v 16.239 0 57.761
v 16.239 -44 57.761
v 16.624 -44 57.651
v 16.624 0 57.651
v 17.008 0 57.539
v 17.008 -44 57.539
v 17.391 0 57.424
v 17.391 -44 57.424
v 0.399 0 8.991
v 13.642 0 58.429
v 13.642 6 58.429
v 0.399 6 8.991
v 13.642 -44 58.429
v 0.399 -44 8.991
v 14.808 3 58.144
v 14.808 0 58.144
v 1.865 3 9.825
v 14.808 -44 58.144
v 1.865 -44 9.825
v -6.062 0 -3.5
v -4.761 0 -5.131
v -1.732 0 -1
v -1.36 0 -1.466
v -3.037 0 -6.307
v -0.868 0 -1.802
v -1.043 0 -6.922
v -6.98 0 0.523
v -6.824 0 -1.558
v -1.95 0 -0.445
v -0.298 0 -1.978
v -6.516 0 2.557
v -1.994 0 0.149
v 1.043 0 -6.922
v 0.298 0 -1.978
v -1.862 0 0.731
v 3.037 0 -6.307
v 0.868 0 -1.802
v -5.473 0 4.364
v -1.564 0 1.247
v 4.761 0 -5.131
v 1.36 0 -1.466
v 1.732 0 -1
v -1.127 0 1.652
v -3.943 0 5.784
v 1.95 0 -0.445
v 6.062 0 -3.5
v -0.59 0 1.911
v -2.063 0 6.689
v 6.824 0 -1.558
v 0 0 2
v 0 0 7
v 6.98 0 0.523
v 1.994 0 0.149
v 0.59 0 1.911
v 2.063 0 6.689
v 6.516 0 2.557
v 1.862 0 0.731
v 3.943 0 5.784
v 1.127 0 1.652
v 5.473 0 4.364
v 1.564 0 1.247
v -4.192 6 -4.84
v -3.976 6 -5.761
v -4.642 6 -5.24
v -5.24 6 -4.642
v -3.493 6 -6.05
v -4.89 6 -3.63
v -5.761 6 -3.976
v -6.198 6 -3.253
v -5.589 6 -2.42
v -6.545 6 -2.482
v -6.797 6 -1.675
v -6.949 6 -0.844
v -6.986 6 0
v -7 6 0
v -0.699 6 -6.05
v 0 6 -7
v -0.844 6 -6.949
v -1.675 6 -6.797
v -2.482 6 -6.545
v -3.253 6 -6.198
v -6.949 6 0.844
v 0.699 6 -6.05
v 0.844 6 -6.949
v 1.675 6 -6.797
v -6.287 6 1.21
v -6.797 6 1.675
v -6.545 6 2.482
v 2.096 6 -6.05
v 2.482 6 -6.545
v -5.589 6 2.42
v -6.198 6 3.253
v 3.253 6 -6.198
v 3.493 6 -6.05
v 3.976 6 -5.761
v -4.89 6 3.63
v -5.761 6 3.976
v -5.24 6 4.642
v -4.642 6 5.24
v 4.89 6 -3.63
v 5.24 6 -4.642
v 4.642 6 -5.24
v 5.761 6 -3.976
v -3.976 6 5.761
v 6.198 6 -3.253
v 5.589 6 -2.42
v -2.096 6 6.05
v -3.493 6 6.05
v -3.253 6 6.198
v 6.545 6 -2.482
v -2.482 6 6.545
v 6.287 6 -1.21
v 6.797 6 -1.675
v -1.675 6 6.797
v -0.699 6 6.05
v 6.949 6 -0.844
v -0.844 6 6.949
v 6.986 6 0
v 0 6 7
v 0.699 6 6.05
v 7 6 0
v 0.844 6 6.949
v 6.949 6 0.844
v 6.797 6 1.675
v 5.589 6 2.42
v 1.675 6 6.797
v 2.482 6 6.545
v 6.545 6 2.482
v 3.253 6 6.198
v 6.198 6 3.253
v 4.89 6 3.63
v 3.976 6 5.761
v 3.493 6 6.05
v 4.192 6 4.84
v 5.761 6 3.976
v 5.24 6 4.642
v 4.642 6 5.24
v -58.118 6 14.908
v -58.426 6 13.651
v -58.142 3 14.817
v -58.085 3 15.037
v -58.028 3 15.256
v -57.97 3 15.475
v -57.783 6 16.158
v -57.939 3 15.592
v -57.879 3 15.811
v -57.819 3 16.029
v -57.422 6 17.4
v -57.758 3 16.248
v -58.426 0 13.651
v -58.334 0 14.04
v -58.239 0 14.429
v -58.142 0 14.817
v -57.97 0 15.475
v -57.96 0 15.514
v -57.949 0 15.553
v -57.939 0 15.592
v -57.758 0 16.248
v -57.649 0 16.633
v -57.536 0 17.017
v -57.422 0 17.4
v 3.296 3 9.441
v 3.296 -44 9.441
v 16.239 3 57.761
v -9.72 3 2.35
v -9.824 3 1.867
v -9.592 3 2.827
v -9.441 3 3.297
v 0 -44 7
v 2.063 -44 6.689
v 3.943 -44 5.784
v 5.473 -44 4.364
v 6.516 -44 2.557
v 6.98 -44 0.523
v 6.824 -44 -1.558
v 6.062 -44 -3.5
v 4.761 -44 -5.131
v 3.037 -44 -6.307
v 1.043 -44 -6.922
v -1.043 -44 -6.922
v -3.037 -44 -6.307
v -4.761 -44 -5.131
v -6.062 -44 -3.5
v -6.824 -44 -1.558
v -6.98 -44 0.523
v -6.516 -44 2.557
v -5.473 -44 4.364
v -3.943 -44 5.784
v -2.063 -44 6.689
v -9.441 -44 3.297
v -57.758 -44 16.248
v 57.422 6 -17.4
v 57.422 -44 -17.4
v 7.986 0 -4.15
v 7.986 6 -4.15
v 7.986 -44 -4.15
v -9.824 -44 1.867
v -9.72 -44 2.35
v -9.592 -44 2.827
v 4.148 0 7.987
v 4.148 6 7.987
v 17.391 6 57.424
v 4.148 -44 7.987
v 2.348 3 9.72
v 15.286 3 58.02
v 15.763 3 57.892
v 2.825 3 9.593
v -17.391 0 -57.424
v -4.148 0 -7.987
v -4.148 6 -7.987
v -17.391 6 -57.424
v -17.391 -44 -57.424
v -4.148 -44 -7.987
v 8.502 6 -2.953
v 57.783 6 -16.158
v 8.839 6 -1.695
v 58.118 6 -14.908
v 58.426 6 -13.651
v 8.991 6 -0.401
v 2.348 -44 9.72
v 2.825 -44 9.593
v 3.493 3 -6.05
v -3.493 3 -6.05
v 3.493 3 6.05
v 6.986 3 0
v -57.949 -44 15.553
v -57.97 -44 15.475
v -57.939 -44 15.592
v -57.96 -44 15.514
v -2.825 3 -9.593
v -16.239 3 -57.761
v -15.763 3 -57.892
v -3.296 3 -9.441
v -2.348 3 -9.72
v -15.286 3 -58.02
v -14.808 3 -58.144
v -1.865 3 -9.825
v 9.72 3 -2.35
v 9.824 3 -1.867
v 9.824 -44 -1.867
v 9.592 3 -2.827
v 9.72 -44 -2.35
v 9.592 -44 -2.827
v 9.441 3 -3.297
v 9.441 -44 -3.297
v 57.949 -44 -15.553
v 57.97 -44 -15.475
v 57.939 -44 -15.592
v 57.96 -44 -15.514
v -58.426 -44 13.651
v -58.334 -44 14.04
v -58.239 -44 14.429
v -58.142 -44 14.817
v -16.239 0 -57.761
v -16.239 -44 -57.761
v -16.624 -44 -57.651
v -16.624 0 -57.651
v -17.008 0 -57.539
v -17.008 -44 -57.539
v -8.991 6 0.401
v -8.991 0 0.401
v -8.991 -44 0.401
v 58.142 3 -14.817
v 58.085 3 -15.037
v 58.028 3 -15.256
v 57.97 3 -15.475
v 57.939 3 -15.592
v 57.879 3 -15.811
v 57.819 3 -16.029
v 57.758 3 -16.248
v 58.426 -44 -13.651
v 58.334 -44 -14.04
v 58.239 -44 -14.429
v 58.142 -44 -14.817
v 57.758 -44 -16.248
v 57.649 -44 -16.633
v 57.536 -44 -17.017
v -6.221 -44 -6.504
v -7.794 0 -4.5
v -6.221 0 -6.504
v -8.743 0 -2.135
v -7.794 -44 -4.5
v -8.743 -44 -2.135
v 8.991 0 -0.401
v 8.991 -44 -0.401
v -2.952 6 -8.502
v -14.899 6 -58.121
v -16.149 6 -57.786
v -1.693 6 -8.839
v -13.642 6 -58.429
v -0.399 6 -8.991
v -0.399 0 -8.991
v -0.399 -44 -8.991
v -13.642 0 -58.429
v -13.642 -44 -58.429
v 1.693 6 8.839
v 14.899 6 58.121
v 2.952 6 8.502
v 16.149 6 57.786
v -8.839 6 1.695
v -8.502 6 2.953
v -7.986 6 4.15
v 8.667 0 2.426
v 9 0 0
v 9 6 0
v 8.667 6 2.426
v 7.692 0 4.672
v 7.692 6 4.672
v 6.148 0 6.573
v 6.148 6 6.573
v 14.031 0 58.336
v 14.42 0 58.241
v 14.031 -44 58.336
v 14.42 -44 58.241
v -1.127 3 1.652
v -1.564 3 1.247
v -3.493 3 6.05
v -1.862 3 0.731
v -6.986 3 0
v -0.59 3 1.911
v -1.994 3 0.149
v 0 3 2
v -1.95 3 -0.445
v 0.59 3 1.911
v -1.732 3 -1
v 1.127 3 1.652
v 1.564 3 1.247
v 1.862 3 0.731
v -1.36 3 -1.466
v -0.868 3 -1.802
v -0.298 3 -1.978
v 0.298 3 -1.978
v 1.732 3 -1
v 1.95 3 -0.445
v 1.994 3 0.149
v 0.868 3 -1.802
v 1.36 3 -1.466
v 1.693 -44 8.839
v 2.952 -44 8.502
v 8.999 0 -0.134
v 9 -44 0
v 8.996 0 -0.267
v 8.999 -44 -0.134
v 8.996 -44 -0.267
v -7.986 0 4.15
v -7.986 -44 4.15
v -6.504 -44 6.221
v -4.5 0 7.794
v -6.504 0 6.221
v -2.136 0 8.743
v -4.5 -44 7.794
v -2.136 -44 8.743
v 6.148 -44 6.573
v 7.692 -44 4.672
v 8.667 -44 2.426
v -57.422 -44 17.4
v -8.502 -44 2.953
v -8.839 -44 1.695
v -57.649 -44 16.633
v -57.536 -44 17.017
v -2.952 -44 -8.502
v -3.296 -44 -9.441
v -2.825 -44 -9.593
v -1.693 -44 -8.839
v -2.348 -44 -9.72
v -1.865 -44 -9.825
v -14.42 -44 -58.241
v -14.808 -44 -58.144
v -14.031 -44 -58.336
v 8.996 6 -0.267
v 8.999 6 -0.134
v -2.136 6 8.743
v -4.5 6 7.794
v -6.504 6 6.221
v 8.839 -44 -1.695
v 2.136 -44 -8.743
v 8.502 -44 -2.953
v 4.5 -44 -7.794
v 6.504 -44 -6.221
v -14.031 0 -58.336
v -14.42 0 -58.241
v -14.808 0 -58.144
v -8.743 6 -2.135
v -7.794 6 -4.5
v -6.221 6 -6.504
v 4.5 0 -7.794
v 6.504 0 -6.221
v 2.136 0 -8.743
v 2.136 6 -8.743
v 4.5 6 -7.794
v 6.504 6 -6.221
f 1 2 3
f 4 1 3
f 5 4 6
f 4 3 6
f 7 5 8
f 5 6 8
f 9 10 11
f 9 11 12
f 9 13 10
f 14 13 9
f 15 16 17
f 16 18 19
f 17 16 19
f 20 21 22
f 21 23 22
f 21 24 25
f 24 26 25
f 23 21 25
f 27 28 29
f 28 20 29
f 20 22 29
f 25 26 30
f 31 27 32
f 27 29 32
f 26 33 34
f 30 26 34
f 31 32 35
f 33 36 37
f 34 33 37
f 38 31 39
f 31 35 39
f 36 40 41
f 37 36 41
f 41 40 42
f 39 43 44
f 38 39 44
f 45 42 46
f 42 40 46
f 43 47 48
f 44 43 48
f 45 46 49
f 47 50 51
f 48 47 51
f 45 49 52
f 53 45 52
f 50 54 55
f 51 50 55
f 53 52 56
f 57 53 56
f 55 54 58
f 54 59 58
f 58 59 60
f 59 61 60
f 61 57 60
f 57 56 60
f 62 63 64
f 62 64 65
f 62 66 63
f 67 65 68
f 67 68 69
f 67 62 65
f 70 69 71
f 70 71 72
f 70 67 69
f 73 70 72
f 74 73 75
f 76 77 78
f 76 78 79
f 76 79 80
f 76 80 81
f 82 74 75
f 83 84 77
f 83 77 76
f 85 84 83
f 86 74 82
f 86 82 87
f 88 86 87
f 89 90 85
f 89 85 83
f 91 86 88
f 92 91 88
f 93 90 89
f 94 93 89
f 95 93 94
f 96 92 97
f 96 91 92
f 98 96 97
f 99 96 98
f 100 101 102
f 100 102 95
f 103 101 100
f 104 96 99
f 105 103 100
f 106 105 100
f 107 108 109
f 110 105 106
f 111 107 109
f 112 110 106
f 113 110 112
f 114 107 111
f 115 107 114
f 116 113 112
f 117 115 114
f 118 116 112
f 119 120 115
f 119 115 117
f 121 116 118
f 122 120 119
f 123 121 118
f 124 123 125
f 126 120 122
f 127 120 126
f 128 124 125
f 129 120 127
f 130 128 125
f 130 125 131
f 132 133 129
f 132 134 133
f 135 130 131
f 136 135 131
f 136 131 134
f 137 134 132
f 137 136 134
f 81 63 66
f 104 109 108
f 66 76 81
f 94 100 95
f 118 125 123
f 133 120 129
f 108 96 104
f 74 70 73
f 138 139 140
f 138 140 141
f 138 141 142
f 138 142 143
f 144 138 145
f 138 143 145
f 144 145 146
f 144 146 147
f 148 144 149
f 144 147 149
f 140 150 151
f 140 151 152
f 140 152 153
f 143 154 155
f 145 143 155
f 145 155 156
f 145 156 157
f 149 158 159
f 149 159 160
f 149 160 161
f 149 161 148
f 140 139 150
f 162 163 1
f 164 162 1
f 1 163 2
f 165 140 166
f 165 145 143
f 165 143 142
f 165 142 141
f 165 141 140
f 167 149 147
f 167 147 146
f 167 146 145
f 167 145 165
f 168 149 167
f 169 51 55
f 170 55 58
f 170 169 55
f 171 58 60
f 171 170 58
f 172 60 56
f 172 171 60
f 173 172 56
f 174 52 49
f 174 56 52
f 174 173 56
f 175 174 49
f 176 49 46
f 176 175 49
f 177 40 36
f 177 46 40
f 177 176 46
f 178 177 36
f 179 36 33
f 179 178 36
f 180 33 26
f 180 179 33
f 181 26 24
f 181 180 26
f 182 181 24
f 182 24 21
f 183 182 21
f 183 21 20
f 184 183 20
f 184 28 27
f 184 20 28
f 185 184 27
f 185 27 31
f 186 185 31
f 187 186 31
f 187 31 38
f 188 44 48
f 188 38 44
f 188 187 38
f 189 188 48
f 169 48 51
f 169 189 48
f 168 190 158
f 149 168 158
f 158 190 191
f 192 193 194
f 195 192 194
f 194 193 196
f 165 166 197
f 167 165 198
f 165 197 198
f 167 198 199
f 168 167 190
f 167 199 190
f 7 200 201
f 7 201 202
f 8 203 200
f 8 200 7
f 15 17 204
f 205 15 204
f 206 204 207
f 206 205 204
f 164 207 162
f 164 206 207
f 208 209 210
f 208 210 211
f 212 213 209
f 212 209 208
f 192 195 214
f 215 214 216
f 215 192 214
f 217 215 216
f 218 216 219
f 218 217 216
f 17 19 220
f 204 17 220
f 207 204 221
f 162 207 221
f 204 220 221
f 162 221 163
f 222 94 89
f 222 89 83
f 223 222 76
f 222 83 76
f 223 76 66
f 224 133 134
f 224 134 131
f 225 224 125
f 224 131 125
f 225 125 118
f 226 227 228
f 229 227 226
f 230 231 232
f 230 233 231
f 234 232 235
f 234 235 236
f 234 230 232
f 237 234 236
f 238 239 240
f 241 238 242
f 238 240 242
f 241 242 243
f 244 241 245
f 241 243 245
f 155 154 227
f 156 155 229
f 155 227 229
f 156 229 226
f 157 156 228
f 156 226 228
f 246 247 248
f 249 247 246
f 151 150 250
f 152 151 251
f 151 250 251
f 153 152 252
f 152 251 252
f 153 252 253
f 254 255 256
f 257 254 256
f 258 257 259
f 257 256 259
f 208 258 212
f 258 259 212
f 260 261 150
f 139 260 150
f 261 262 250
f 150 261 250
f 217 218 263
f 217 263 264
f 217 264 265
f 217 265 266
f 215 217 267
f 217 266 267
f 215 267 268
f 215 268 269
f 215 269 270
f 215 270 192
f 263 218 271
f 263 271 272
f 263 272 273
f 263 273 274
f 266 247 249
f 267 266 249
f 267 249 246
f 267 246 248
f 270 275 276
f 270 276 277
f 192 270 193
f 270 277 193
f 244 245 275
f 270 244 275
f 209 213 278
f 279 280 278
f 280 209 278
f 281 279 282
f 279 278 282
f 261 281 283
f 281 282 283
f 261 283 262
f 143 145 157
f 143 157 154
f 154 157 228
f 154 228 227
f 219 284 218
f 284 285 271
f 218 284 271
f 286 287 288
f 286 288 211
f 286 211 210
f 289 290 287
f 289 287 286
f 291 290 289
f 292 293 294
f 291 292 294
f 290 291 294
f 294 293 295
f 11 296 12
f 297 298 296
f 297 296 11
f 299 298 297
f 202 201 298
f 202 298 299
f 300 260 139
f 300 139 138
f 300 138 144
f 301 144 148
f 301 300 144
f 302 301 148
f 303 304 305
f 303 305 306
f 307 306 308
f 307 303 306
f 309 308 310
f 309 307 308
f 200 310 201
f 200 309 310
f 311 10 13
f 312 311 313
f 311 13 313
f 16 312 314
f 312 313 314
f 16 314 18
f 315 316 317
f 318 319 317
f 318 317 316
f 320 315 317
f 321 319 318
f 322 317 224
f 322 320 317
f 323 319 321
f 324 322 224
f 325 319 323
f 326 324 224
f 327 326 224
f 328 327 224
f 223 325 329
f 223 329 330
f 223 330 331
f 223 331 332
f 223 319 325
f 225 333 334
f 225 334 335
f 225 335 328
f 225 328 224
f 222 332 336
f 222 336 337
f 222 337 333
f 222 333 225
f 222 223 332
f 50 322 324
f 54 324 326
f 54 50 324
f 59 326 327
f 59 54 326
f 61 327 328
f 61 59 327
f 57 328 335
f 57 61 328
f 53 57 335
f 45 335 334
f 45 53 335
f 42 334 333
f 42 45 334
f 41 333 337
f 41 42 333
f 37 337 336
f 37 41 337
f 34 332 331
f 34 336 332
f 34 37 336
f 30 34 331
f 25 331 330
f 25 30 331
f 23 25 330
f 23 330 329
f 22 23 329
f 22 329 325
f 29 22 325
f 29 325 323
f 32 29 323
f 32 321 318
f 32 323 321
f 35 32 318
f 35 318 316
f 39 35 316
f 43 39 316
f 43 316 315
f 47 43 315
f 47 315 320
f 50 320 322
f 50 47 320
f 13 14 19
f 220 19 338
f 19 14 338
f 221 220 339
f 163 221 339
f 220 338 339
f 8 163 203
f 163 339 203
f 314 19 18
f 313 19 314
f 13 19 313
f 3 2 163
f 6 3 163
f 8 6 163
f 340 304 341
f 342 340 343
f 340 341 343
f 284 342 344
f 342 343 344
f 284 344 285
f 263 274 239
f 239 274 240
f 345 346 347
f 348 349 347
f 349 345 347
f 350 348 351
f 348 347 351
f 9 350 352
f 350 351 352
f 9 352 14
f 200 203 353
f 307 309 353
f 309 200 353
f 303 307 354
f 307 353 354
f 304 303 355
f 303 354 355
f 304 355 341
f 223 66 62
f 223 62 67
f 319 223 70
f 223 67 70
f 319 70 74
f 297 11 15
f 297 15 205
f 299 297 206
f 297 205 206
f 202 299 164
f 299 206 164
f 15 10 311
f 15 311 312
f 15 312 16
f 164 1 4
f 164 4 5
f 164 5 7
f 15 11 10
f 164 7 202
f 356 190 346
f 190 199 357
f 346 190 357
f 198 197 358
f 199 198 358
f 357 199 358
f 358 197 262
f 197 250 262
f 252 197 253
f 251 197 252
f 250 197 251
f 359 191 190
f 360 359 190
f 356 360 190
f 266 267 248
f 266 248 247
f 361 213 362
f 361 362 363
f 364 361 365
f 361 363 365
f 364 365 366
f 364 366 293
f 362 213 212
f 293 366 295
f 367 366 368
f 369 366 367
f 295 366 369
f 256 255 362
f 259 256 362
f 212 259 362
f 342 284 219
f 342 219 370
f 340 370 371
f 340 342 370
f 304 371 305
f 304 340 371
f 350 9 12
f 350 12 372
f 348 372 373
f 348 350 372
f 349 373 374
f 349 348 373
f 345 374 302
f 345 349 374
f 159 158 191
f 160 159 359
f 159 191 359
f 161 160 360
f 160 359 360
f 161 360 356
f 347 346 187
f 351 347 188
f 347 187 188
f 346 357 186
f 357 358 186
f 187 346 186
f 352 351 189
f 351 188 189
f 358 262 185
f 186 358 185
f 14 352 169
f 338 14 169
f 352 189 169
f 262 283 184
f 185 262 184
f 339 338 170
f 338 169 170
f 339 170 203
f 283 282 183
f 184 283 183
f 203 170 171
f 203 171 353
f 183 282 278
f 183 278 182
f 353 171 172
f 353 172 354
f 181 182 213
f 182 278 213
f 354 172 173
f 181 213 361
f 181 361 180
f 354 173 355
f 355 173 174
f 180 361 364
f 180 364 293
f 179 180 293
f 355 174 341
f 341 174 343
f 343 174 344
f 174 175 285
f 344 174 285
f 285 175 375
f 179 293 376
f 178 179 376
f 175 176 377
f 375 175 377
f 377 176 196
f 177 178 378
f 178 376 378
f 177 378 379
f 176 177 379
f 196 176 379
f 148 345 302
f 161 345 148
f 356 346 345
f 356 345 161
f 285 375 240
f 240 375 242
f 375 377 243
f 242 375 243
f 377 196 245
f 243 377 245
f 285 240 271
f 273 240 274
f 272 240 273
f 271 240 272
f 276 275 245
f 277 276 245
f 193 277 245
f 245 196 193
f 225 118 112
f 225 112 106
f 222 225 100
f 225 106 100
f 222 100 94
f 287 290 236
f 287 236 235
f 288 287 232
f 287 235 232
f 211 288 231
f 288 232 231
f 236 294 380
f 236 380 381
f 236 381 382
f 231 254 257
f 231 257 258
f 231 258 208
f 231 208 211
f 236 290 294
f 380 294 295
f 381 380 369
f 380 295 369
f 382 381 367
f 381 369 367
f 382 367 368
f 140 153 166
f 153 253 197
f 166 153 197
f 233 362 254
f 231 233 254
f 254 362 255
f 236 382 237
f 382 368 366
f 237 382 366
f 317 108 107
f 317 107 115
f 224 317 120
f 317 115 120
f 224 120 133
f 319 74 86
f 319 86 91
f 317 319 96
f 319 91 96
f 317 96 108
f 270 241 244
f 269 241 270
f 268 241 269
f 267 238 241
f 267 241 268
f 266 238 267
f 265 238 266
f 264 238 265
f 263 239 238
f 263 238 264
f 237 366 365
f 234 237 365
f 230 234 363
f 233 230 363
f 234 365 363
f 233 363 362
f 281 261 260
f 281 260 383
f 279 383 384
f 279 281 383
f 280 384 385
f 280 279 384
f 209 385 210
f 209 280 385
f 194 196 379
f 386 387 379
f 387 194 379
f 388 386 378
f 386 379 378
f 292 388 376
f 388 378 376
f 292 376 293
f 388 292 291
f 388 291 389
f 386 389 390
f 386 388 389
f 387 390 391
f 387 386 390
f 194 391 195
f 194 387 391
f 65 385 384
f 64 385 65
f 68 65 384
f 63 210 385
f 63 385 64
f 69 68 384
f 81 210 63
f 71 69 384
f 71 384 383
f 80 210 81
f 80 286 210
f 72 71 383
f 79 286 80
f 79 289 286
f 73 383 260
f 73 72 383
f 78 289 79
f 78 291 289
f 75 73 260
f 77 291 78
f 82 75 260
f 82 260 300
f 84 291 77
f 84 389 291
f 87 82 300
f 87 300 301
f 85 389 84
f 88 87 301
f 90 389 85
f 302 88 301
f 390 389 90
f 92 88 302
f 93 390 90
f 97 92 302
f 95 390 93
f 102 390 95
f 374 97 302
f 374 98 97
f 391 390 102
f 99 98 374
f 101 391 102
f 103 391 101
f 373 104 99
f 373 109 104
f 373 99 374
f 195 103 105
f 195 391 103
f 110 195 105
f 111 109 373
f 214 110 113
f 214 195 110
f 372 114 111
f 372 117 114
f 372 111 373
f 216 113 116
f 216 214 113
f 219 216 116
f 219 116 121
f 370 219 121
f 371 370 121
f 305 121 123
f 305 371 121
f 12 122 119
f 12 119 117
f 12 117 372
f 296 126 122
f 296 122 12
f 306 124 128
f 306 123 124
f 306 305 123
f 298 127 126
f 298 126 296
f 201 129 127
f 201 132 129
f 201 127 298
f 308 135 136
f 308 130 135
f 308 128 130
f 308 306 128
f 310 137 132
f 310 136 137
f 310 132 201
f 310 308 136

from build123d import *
from build123d.topology import SkipClean

# Parameters (mm, degrees)
SKETCH_1_R          = 60
SKETCH_1_R_2        = 2
EXTRUDE_1_DEPTH     = 6
CUT_EXTRUDE_1_DEPTH = 3
CUT_EXTRUDE_START   = -6
CUT_EXTRUDE_2_DEPTH = 6
EXTRUDE_START       = -50
EXTRUDE_2_DEPTH     = 50
SKETCH_4_4_R        = 9
SKETCH_4_4_R_2      = 7
EXTRUDE_3_DEPTH     = 50
CUT_EXTRUDE_4_DEPTH = 47


# Read off the part's stored shape, not the designer's step: 切除-拉伸2
with BuildPart() as part:
    # 草图1 → 凸台-拉伸1 (new body)
    with BuildSketch(Plane(origin=(0, 0, 0), x_dir=(1, 0, 0), z_dir=(0, 1, 0))):
        with Locations(Location((0, 0, 0), (0, 0, 270))):
            Circle(SKETCH_1_R)
        with Locations(Location((0, 0, 0), (0, 0, 270))):
            Circle(SKETCH_1_R_2, mode=Mode.SUBTRACT)
    extrude(amount=EXTRUDE_1_DEPTH)

    # 草图2 → 切除-拉伸1 (cut)
    with BuildSketch(Plane(origin=(0, 6, 0), x_dir=(1, 0, 0), z_dir=(0, 1, 0))):
        Polygon((-3.492969129, -6.05), (3.492969129, -6.05), (6.985938257, 0), (3.492969129, 6.05), (-3.492969129, 6.05), (-6.985938257, 0), align=None)
    extrude(amount=-CUT_EXTRUDE_1_DEPTH, mode=Mode.SUBTRACT)

    # 切除-拉伸2 outline → 切除-拉伸2 (cut)
    with BuildSketch(Plane(origin=(0, 6, 0), x_dir=(1, 0, 0), z_dir=(0, 1, 0)).offset(CUT_EXTRUDE_START)):
        with BuildLine():
            ThreePointArc((-0.399423258, 8.991132357), (4.5, 7.794228634), (7.986260659, 4.14965549))
            Line((7.986260659, 4.14965549), (57.42161539, 17.399944999))
            ThreePointArc((57.42161539, 17.399944999), (30, 51.961524227), (-13.642013302, 58.428550154))
            Line((-13.642013302, 58.428550154), (-0.399423258, 8.991132357))
        make_face()
        with BuildLine():
            ThreePointArc((17.391001663, -57.424324647), (51.961524227, -30), (58.426424771, 13.651113086))
            Line((58.426424771, 13.651113086), (8.99107004, 0.400823577))
            ThreePointArc((8.99107004, 0.400823577), (7.794228634, -4.5), (4.14841162, -7.98690685))
            Line((4.14841162, -7.98690685), (17.391001663, -57.424324647))
        make_face()
        with BuildLine():
            Line((-4.14841162, 7.98690685), (-17.391001663, 57.424324647))
            ThreePointArc((-17.391001663, 57.424324647), (-51.961524227, 30), (-58.426424771, -13.651113086))
            Line((-58.426424771, -13.651113086), (-8.99107004, -0.400823577))
            ThreePointArc((-8.99107004, -0.400823577), (-7.794228634, 4.5), (-4.14841162, 7.98690685))
        make_face()
        with BuildLine():
            Line((-7.986260659, -4.14965549), (-57.42161539, -17.399944999))
            ThreePointArc((-57.42161539, -17.399944999), (-30, -51.961524227), (13.642013302, -58.428550154))
            Line((13.642013302, -58.428550154), (0.399423258, -8.991132357))
            ThreePointArc((0.399423258, -8.991132357), (-4.5, -7.794228634), (-7.986260659, -4.14965549))
        make_face()
    extrude(amount=CUT_EXTRUDE_2_DEPTH, mode=Mode.SUBTRACT)

    # 草图4<3> → 凸台-拉伸2 (add)
    with BuildSketch(Plane(origin=(0, 6, 0), x_dir=(1, 0, 0), z_dir=(0, 1, 0)).offset(EXTRUDE_START)):
        with BuildLine():
            Line((8.99107004, 0.400823577), (58.426424771, 13.651113086))
            ThreePointArc((58.426424771, 13.651113086), (57.954340109, 15.5336558), (57.42161539, 17.399944999))
            Line((57.42161539, 17.399944999), (7.986260659, 4.14965549))
            ThreePointArc((7.986260659, 4.14965549), (8.693151016, 2.33004837), (8.99107004, 0.400823577))
        make_face()
        with BuildLine():
            Line((17.391001663, -57.424324647), (4.14841162, -7.98690685))
            ThreePointArc((4.14841162, -7.98690685), (2.328694427, -8.693513804), (0.399423258, -8.991132357))
            Line((0.399423258, -8.991132357), (13.642013302, -58.428550154))
            ThreePointArc((13.642013302, -58.428550154), (15.524629518, -57.956758694), (17.391001663, -57.424324647))
        make_face()
        with BuildLine():
            Line((-0.399423258, 8.991132357), (-13.642013302, 58.428550154))
            ThreePointArc((-13.642013302, 58.428550154), (-15.524629518, 57.956758694), (-17.391001663, 57.424324647))
            Line((-17.391001663, 57.424324647), (-4.14841162, 7.98690685))
            ThreePointArc((-4.14841162, 7.98690685), (-2.328694427, 8.693513804), (-0.399423258, 8.991132357))
        make_face()
        with BuildLine():
            Line((-57.42161539, -17.399944999), (-7.986260659, -4.14965549))
            ThreePointArc((-7.986260659, -4.14965549), (-8.693151016, -2.33004837), (-8.99107004, -0.400823577))
            Line((-8.99107004, -0.400823577), (-58.426424771, -13.651113086))
            ThreePointArc((-58.426424771, -13.651113086), (-57.954340109, -15.5336558), (-57.42161539, -17.399944999))
        make_face()
    extrude(amount=EXTRUDE_2_DEPTH)

    # 草图4<4> → 凸台-拉伸3 (add)
    with SkipClean():  # the faces are left unmerged after this step: merging them gives an invalid solid
        with BuildSketch(Plane(origin=(0, 6, 0), x_dir=(1, 0, 0), z_dir=(0, 1, 0)).offset(EXTRUDE_START)):
            Circle(SKETCH_4_4_R)
            with Locations(Location((0, 0, 0), (0, 0, 270))):
                Circle(SKETCH_4_4_R_2, mode=Mode.SUBTRACT)
        extrude(amount=EXTRUDE_3_DEPTH)
    add(part.part.scale(1), mode=Mode.REPLACE)  # the faces are merged on a copy

    # 草图5 → 切除-拉伸4 (cut)
    with SkipClean():  # the faces are left unmerged after this step: merging them gives an invalid solid
        with BuildSketch(Plane.XZ.offset(44)):
            with BuildLine():
                Line((3.295692014, 9.441314217), (16.239993631, 57.765157595))
                Line((16.239993631, 57.765157595), (14.809275617, 58.148397921))
                Line((14.809275617, 58.148397921), (1.864974, 9.824554544))
                ThreePointArc((1.864974, 9.824554544), (2.587438253, 9.659459782), (3.295692014, 9.441314217))
            make_face()
            with BuildLine():
                Line((58.146042416, -14.818318801), (9.824263964, -1.866504102))
                ThreePointArc((9.824263964, -1.866504102), (9.659056685, -2.588942633), (9.440800816, -3.29716241))
                Line((9.440800816, -3.29716241), (57.762579268, -16.24897711))
                Line((57.762579268, -16.24897711), (58.146042416, -14.818318801))
            make_face()
            with BuildLine():
                ThreePointArc((-9.824263964, 1.866504102), (-9.659056685, 2.588942633), (-9.440800816, 3.29716241))
                Line((-9.440800816, 3.29716241), (-57.762579268, 16.24897711))
                Line((-57.762579268, 16.24897711), (-58.146042416, 14.818318801))
                Line((-58.146042416, 14.818318801), (-9.824263964, 1.866504102))
            make_face()
            with BuildLine():
                Line((-14.809275617, -58.148397921), (-1.864974, -9.824554544))
                ThreePointArc((-1.864974, -9.824554544), (-2.587438253, -9.659459782), (-3.295692014, -9.441314217))
                Line((-3.295692014, -9.441314217), (-16.239993631, -57.765157595))
                Line((-16.239993631, -57.765157595), (-14.809275617, -58.148397921))
            make_face()
        extrude(amount=-CUT_EXTRUDE_4_DEPTH, mode=Mode.SUBTRACT)


solid = part.part
